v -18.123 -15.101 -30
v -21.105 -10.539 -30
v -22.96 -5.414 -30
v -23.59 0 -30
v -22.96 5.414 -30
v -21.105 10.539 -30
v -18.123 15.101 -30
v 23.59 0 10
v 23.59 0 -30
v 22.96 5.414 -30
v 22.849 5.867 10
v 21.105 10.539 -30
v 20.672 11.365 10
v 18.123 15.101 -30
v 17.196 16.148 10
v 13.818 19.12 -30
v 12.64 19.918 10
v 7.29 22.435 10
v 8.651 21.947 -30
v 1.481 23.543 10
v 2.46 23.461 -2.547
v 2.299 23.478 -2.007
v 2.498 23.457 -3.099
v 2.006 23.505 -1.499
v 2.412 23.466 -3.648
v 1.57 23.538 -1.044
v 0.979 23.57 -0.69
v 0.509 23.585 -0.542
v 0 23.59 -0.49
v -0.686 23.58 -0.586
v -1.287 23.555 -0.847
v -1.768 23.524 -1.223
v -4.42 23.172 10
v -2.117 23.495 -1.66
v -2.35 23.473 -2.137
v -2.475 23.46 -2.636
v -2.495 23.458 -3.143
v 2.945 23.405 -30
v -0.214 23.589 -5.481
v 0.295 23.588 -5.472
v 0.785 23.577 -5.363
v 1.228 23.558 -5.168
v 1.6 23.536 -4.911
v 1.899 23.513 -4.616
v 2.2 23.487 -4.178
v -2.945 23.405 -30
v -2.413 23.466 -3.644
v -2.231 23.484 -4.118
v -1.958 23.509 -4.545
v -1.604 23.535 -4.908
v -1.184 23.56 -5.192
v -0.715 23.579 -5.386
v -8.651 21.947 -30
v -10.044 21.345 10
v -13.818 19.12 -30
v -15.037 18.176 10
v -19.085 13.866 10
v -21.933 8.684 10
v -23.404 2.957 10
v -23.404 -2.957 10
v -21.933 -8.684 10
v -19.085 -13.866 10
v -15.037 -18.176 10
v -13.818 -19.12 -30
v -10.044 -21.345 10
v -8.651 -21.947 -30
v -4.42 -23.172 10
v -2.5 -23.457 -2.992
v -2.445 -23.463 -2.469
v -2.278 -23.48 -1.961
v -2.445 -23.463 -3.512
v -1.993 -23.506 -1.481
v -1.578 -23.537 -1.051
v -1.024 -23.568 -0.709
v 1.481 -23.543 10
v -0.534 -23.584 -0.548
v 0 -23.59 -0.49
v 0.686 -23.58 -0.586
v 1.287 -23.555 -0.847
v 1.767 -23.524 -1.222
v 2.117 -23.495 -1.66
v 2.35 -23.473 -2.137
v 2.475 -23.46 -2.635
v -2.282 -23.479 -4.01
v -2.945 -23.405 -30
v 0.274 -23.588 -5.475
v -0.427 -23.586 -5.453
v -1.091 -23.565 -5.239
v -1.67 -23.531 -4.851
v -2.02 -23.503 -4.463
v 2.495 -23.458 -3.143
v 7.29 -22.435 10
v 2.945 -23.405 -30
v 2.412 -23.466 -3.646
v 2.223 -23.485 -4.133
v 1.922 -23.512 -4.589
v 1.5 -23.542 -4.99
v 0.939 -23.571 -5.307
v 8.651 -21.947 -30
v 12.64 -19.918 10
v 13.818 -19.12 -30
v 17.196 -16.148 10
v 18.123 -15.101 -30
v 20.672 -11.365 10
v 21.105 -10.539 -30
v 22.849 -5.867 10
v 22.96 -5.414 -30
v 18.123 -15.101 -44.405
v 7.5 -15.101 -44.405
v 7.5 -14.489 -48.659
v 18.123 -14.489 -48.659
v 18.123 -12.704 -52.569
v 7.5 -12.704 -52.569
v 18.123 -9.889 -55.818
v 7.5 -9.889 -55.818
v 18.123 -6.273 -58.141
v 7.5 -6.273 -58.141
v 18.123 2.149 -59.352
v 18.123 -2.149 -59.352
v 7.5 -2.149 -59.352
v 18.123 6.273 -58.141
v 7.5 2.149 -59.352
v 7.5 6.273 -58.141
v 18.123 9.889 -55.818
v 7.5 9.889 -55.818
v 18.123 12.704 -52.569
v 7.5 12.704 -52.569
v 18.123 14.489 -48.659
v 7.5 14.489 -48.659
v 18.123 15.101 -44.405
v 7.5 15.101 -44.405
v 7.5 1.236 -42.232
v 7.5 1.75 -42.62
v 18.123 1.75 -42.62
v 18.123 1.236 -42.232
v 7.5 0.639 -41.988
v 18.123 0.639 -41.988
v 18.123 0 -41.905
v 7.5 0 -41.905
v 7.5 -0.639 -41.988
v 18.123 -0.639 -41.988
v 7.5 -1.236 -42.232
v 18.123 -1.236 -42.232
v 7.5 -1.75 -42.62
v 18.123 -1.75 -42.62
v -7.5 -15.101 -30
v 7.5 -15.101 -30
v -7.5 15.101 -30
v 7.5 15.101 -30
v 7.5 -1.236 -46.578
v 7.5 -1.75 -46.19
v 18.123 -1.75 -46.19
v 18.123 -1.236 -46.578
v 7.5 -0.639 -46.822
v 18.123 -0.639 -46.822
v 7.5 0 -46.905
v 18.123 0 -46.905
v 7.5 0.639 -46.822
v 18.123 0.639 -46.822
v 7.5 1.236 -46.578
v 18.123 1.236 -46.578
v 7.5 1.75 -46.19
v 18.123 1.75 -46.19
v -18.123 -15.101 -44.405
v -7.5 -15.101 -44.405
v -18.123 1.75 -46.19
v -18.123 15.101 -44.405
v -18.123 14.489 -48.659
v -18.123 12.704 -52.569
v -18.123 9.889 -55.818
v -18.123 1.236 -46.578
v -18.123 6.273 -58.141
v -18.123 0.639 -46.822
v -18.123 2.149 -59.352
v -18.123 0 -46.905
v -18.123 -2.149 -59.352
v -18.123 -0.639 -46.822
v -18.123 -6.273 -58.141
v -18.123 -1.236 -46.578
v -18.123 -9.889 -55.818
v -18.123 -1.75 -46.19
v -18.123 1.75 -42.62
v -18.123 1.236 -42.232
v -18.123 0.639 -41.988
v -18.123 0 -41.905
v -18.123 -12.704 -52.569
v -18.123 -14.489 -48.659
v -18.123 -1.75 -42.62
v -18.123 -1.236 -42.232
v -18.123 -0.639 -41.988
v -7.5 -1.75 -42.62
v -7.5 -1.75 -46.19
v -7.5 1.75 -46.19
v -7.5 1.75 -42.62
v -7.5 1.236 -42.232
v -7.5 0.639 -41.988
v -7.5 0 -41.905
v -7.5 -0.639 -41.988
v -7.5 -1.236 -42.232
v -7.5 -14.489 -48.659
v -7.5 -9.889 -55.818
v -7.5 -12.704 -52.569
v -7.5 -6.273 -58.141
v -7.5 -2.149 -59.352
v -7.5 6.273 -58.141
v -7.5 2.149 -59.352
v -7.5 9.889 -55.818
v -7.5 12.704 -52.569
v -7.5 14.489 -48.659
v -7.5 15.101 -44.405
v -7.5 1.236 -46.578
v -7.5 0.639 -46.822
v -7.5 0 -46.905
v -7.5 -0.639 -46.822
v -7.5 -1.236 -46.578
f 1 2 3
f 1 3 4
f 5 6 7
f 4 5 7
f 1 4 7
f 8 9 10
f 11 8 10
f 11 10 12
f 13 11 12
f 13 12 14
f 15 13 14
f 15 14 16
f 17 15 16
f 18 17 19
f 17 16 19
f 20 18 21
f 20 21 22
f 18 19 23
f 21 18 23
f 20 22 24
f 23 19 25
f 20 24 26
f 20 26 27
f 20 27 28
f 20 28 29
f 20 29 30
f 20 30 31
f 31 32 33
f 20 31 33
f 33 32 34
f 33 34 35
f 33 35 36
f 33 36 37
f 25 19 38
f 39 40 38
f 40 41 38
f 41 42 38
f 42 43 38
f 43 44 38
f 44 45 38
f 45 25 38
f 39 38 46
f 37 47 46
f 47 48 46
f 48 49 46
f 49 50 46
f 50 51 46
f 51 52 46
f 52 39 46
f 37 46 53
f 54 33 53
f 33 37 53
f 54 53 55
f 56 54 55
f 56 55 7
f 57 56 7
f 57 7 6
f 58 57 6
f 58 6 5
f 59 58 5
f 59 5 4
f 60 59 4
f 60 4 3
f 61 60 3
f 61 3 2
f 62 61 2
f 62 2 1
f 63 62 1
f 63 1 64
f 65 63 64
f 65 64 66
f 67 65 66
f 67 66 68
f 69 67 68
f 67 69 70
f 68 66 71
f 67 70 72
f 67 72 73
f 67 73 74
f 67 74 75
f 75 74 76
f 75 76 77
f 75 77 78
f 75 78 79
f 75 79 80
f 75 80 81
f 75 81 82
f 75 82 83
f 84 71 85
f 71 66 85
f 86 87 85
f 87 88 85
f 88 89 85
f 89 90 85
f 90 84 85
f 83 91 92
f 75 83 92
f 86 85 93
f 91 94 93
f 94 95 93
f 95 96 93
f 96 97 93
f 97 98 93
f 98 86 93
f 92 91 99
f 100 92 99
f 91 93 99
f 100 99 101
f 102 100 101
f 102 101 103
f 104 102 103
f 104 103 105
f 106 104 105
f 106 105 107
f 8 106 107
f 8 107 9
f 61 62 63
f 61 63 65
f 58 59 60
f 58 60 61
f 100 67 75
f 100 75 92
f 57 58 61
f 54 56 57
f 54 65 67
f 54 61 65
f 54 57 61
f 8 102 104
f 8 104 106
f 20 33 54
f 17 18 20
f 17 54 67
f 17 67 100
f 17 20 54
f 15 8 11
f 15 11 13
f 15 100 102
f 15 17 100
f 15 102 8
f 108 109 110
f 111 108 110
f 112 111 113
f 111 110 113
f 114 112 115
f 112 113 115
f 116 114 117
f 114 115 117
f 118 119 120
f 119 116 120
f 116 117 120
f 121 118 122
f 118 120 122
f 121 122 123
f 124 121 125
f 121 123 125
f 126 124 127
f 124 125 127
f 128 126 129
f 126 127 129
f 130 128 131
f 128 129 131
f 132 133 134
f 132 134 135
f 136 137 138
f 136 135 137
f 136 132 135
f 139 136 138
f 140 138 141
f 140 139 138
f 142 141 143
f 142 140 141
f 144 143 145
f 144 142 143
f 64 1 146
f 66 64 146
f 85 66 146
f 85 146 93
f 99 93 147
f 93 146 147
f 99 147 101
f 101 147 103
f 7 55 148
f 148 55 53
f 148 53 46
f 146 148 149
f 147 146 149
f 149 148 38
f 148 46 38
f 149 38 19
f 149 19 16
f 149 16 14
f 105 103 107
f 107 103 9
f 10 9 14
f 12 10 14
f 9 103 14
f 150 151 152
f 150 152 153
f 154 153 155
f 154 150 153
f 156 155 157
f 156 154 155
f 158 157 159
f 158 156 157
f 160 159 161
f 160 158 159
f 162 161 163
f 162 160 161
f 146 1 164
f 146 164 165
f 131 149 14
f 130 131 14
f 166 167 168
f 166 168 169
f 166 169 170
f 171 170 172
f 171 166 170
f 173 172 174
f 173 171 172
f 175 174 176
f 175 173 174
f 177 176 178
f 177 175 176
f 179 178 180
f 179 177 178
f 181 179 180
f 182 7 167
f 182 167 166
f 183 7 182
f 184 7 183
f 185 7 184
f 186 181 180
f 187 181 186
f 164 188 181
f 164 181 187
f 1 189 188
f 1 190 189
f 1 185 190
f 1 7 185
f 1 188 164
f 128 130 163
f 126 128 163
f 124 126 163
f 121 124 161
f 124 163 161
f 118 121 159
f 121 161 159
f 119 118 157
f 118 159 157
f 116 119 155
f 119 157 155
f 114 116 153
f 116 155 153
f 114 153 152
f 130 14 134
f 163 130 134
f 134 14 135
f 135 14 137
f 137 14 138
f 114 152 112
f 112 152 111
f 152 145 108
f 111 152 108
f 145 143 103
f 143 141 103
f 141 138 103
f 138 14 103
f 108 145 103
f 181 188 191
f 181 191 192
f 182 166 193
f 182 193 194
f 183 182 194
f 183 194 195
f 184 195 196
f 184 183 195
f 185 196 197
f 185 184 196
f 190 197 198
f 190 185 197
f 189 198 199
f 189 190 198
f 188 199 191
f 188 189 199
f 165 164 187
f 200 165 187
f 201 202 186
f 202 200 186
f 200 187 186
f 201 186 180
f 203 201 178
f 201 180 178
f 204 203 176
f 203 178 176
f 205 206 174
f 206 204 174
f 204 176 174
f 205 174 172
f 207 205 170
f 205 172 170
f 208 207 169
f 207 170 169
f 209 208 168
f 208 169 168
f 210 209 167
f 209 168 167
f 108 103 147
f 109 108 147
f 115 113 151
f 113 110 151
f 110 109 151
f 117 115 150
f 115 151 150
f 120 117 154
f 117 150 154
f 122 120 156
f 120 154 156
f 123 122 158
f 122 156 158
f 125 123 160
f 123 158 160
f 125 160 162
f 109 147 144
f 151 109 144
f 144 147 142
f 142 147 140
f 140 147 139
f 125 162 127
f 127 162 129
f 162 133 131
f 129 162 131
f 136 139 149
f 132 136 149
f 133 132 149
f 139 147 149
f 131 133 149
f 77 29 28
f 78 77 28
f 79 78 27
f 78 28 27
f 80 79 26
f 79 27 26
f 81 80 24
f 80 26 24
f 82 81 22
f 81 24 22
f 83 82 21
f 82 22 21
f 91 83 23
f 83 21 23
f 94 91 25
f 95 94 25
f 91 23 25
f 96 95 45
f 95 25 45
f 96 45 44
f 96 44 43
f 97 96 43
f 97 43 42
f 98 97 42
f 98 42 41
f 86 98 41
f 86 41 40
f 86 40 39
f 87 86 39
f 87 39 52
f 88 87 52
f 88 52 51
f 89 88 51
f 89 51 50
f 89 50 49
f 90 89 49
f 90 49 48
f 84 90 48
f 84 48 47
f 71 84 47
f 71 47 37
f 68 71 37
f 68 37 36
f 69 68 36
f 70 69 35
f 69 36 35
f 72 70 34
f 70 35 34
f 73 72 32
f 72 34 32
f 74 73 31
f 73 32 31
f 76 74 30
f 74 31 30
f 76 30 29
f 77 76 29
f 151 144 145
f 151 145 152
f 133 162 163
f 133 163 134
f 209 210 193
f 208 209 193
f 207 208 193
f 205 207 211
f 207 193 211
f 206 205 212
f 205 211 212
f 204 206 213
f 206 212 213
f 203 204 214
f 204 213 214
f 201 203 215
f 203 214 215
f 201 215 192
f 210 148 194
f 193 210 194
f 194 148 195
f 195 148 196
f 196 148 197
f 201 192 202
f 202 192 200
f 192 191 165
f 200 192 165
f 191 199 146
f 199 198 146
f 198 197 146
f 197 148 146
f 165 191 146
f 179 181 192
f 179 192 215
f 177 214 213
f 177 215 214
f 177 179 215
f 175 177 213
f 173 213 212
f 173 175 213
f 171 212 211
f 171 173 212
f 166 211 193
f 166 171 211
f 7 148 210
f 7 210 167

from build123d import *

# Parameters (mm, degrees)
RESSALTO_EXTRUS_O1_DEPTH      = 10
RESSALTO_EXTRUS_O1_DEPTH_BACK = 30
ESBO_O1_R                     = 23.59
RESSALTO_EXTRUS_O2_DEPTH      = 30
CORTE_EXTRUS_O1_DEPTH         = 59.405
CORTE_EXTRUS_O2_DEPTH         = 79.405
SKETCH2_R                     = 2.5
CUT_EXTRUDE1_DEPTH            = 80.519934634


with BuildPart() as part:
    # Esboço1 → Ressalto-extrusão1 (new, two sides: drawn at the far end of the back side and taken through both)
    with BuildSketch(Plane.XY.offset(-RESSALTO_EXTRUS_O1_DEPTH_BACK)):
        Circle(ESBO_O1_R)
    extrude(amount=RESSALTO_EXTRUS_O1_DEPTH + RESSALTO_EXTRUS_O1_DEPTH_BACK)

    # Esboço2 → Ressalto-extrusão2 (add)
    with BuildSketch(Plane(origin=(0, 0, -30), x_dir=(-1, 0, 0), z_dir=(0, 0, -1))):
        Polygon((-7.5, -15.101129972), (-7.5, 0), (-7.5, 15.101129972), (-18.123023301, 15.101129972), (-18.123023301, -15.101129972), align=None)
        Polygon((7.5, -15.101129972), (7.5, 0), (7.5, 15.101129972), (18.123023301, 15.101129972), (18.123023301, -15.101129972), align=None)
    extrude(amount=RESSALTO_EXTRUS_O2_DEPTH)

    # Esboço3 → Corte-extrusão1 (cut, symmetric)
    with BuildSketch(Plane.ZY.offset(18.123023301)):
        with BuildLine():
            Line((-44.405, 18.172432148), (-62.563044424, 18.172432148))
            Line((-62.563044424, 18.172432148), (-62.563044424, -18.251867877))
            Line((-62.563044424, -18.251867877), (-44.405, -18.251867877))
            Line((-44.405, -18.251867877), (-44.405, -15.101129972))
            ThreePointArc((-44.405, -15.101129972), (-59.506129972, 0), (-44.405, 15.101129972))
            Line((-44.405, 15.101129972), (-44.405, 18.172432148))
        make_face()
    extrude(amount=CORTE_EXTRUS_O1_DEPTH, both=True, mode=Mode.SUBTRACT)

    # Esboço4 → Corte-extrusão2 (cut, symmetric)
    with BuildSketch(Plane.ZY.offset(18.123023301)):
        with BuildLine():
            Line((-46.190357107, 1.75), (-42.619642893, 1.75))
            ThreePointArc((-42.619642893, 1.75), (-41.905, 0), (-42.619642893, -1.75))
            Line((-42.619642893, -1.75), (-46.190357107, -1.75))
            ThreePointArc((-46.190357107, -1.75), (-46.905, 0), (-46.190357107, 1.75))
        make_face()
    extrude(amount=CORTE_EXTRUS_O2_DEPTH, both=True, mode=Mode.SUBTRACT)

    # Sketch2 → Cut-Extrude1 (cut, through all)
    with BuildSketch(Plane(origin=(0, 23.59, 0), x_dir=(1, 0, 0), z_dir=(0, 1, 0))):
        with Locations(Location((0, 2.99, 0), (0, 0, 270))):
            Circle(SKETCH2_R)
    extrude(amount=-CUT_EXTRUDE1_DEPTH, mode=Mode.SUBTRACT)


solid = part.part
